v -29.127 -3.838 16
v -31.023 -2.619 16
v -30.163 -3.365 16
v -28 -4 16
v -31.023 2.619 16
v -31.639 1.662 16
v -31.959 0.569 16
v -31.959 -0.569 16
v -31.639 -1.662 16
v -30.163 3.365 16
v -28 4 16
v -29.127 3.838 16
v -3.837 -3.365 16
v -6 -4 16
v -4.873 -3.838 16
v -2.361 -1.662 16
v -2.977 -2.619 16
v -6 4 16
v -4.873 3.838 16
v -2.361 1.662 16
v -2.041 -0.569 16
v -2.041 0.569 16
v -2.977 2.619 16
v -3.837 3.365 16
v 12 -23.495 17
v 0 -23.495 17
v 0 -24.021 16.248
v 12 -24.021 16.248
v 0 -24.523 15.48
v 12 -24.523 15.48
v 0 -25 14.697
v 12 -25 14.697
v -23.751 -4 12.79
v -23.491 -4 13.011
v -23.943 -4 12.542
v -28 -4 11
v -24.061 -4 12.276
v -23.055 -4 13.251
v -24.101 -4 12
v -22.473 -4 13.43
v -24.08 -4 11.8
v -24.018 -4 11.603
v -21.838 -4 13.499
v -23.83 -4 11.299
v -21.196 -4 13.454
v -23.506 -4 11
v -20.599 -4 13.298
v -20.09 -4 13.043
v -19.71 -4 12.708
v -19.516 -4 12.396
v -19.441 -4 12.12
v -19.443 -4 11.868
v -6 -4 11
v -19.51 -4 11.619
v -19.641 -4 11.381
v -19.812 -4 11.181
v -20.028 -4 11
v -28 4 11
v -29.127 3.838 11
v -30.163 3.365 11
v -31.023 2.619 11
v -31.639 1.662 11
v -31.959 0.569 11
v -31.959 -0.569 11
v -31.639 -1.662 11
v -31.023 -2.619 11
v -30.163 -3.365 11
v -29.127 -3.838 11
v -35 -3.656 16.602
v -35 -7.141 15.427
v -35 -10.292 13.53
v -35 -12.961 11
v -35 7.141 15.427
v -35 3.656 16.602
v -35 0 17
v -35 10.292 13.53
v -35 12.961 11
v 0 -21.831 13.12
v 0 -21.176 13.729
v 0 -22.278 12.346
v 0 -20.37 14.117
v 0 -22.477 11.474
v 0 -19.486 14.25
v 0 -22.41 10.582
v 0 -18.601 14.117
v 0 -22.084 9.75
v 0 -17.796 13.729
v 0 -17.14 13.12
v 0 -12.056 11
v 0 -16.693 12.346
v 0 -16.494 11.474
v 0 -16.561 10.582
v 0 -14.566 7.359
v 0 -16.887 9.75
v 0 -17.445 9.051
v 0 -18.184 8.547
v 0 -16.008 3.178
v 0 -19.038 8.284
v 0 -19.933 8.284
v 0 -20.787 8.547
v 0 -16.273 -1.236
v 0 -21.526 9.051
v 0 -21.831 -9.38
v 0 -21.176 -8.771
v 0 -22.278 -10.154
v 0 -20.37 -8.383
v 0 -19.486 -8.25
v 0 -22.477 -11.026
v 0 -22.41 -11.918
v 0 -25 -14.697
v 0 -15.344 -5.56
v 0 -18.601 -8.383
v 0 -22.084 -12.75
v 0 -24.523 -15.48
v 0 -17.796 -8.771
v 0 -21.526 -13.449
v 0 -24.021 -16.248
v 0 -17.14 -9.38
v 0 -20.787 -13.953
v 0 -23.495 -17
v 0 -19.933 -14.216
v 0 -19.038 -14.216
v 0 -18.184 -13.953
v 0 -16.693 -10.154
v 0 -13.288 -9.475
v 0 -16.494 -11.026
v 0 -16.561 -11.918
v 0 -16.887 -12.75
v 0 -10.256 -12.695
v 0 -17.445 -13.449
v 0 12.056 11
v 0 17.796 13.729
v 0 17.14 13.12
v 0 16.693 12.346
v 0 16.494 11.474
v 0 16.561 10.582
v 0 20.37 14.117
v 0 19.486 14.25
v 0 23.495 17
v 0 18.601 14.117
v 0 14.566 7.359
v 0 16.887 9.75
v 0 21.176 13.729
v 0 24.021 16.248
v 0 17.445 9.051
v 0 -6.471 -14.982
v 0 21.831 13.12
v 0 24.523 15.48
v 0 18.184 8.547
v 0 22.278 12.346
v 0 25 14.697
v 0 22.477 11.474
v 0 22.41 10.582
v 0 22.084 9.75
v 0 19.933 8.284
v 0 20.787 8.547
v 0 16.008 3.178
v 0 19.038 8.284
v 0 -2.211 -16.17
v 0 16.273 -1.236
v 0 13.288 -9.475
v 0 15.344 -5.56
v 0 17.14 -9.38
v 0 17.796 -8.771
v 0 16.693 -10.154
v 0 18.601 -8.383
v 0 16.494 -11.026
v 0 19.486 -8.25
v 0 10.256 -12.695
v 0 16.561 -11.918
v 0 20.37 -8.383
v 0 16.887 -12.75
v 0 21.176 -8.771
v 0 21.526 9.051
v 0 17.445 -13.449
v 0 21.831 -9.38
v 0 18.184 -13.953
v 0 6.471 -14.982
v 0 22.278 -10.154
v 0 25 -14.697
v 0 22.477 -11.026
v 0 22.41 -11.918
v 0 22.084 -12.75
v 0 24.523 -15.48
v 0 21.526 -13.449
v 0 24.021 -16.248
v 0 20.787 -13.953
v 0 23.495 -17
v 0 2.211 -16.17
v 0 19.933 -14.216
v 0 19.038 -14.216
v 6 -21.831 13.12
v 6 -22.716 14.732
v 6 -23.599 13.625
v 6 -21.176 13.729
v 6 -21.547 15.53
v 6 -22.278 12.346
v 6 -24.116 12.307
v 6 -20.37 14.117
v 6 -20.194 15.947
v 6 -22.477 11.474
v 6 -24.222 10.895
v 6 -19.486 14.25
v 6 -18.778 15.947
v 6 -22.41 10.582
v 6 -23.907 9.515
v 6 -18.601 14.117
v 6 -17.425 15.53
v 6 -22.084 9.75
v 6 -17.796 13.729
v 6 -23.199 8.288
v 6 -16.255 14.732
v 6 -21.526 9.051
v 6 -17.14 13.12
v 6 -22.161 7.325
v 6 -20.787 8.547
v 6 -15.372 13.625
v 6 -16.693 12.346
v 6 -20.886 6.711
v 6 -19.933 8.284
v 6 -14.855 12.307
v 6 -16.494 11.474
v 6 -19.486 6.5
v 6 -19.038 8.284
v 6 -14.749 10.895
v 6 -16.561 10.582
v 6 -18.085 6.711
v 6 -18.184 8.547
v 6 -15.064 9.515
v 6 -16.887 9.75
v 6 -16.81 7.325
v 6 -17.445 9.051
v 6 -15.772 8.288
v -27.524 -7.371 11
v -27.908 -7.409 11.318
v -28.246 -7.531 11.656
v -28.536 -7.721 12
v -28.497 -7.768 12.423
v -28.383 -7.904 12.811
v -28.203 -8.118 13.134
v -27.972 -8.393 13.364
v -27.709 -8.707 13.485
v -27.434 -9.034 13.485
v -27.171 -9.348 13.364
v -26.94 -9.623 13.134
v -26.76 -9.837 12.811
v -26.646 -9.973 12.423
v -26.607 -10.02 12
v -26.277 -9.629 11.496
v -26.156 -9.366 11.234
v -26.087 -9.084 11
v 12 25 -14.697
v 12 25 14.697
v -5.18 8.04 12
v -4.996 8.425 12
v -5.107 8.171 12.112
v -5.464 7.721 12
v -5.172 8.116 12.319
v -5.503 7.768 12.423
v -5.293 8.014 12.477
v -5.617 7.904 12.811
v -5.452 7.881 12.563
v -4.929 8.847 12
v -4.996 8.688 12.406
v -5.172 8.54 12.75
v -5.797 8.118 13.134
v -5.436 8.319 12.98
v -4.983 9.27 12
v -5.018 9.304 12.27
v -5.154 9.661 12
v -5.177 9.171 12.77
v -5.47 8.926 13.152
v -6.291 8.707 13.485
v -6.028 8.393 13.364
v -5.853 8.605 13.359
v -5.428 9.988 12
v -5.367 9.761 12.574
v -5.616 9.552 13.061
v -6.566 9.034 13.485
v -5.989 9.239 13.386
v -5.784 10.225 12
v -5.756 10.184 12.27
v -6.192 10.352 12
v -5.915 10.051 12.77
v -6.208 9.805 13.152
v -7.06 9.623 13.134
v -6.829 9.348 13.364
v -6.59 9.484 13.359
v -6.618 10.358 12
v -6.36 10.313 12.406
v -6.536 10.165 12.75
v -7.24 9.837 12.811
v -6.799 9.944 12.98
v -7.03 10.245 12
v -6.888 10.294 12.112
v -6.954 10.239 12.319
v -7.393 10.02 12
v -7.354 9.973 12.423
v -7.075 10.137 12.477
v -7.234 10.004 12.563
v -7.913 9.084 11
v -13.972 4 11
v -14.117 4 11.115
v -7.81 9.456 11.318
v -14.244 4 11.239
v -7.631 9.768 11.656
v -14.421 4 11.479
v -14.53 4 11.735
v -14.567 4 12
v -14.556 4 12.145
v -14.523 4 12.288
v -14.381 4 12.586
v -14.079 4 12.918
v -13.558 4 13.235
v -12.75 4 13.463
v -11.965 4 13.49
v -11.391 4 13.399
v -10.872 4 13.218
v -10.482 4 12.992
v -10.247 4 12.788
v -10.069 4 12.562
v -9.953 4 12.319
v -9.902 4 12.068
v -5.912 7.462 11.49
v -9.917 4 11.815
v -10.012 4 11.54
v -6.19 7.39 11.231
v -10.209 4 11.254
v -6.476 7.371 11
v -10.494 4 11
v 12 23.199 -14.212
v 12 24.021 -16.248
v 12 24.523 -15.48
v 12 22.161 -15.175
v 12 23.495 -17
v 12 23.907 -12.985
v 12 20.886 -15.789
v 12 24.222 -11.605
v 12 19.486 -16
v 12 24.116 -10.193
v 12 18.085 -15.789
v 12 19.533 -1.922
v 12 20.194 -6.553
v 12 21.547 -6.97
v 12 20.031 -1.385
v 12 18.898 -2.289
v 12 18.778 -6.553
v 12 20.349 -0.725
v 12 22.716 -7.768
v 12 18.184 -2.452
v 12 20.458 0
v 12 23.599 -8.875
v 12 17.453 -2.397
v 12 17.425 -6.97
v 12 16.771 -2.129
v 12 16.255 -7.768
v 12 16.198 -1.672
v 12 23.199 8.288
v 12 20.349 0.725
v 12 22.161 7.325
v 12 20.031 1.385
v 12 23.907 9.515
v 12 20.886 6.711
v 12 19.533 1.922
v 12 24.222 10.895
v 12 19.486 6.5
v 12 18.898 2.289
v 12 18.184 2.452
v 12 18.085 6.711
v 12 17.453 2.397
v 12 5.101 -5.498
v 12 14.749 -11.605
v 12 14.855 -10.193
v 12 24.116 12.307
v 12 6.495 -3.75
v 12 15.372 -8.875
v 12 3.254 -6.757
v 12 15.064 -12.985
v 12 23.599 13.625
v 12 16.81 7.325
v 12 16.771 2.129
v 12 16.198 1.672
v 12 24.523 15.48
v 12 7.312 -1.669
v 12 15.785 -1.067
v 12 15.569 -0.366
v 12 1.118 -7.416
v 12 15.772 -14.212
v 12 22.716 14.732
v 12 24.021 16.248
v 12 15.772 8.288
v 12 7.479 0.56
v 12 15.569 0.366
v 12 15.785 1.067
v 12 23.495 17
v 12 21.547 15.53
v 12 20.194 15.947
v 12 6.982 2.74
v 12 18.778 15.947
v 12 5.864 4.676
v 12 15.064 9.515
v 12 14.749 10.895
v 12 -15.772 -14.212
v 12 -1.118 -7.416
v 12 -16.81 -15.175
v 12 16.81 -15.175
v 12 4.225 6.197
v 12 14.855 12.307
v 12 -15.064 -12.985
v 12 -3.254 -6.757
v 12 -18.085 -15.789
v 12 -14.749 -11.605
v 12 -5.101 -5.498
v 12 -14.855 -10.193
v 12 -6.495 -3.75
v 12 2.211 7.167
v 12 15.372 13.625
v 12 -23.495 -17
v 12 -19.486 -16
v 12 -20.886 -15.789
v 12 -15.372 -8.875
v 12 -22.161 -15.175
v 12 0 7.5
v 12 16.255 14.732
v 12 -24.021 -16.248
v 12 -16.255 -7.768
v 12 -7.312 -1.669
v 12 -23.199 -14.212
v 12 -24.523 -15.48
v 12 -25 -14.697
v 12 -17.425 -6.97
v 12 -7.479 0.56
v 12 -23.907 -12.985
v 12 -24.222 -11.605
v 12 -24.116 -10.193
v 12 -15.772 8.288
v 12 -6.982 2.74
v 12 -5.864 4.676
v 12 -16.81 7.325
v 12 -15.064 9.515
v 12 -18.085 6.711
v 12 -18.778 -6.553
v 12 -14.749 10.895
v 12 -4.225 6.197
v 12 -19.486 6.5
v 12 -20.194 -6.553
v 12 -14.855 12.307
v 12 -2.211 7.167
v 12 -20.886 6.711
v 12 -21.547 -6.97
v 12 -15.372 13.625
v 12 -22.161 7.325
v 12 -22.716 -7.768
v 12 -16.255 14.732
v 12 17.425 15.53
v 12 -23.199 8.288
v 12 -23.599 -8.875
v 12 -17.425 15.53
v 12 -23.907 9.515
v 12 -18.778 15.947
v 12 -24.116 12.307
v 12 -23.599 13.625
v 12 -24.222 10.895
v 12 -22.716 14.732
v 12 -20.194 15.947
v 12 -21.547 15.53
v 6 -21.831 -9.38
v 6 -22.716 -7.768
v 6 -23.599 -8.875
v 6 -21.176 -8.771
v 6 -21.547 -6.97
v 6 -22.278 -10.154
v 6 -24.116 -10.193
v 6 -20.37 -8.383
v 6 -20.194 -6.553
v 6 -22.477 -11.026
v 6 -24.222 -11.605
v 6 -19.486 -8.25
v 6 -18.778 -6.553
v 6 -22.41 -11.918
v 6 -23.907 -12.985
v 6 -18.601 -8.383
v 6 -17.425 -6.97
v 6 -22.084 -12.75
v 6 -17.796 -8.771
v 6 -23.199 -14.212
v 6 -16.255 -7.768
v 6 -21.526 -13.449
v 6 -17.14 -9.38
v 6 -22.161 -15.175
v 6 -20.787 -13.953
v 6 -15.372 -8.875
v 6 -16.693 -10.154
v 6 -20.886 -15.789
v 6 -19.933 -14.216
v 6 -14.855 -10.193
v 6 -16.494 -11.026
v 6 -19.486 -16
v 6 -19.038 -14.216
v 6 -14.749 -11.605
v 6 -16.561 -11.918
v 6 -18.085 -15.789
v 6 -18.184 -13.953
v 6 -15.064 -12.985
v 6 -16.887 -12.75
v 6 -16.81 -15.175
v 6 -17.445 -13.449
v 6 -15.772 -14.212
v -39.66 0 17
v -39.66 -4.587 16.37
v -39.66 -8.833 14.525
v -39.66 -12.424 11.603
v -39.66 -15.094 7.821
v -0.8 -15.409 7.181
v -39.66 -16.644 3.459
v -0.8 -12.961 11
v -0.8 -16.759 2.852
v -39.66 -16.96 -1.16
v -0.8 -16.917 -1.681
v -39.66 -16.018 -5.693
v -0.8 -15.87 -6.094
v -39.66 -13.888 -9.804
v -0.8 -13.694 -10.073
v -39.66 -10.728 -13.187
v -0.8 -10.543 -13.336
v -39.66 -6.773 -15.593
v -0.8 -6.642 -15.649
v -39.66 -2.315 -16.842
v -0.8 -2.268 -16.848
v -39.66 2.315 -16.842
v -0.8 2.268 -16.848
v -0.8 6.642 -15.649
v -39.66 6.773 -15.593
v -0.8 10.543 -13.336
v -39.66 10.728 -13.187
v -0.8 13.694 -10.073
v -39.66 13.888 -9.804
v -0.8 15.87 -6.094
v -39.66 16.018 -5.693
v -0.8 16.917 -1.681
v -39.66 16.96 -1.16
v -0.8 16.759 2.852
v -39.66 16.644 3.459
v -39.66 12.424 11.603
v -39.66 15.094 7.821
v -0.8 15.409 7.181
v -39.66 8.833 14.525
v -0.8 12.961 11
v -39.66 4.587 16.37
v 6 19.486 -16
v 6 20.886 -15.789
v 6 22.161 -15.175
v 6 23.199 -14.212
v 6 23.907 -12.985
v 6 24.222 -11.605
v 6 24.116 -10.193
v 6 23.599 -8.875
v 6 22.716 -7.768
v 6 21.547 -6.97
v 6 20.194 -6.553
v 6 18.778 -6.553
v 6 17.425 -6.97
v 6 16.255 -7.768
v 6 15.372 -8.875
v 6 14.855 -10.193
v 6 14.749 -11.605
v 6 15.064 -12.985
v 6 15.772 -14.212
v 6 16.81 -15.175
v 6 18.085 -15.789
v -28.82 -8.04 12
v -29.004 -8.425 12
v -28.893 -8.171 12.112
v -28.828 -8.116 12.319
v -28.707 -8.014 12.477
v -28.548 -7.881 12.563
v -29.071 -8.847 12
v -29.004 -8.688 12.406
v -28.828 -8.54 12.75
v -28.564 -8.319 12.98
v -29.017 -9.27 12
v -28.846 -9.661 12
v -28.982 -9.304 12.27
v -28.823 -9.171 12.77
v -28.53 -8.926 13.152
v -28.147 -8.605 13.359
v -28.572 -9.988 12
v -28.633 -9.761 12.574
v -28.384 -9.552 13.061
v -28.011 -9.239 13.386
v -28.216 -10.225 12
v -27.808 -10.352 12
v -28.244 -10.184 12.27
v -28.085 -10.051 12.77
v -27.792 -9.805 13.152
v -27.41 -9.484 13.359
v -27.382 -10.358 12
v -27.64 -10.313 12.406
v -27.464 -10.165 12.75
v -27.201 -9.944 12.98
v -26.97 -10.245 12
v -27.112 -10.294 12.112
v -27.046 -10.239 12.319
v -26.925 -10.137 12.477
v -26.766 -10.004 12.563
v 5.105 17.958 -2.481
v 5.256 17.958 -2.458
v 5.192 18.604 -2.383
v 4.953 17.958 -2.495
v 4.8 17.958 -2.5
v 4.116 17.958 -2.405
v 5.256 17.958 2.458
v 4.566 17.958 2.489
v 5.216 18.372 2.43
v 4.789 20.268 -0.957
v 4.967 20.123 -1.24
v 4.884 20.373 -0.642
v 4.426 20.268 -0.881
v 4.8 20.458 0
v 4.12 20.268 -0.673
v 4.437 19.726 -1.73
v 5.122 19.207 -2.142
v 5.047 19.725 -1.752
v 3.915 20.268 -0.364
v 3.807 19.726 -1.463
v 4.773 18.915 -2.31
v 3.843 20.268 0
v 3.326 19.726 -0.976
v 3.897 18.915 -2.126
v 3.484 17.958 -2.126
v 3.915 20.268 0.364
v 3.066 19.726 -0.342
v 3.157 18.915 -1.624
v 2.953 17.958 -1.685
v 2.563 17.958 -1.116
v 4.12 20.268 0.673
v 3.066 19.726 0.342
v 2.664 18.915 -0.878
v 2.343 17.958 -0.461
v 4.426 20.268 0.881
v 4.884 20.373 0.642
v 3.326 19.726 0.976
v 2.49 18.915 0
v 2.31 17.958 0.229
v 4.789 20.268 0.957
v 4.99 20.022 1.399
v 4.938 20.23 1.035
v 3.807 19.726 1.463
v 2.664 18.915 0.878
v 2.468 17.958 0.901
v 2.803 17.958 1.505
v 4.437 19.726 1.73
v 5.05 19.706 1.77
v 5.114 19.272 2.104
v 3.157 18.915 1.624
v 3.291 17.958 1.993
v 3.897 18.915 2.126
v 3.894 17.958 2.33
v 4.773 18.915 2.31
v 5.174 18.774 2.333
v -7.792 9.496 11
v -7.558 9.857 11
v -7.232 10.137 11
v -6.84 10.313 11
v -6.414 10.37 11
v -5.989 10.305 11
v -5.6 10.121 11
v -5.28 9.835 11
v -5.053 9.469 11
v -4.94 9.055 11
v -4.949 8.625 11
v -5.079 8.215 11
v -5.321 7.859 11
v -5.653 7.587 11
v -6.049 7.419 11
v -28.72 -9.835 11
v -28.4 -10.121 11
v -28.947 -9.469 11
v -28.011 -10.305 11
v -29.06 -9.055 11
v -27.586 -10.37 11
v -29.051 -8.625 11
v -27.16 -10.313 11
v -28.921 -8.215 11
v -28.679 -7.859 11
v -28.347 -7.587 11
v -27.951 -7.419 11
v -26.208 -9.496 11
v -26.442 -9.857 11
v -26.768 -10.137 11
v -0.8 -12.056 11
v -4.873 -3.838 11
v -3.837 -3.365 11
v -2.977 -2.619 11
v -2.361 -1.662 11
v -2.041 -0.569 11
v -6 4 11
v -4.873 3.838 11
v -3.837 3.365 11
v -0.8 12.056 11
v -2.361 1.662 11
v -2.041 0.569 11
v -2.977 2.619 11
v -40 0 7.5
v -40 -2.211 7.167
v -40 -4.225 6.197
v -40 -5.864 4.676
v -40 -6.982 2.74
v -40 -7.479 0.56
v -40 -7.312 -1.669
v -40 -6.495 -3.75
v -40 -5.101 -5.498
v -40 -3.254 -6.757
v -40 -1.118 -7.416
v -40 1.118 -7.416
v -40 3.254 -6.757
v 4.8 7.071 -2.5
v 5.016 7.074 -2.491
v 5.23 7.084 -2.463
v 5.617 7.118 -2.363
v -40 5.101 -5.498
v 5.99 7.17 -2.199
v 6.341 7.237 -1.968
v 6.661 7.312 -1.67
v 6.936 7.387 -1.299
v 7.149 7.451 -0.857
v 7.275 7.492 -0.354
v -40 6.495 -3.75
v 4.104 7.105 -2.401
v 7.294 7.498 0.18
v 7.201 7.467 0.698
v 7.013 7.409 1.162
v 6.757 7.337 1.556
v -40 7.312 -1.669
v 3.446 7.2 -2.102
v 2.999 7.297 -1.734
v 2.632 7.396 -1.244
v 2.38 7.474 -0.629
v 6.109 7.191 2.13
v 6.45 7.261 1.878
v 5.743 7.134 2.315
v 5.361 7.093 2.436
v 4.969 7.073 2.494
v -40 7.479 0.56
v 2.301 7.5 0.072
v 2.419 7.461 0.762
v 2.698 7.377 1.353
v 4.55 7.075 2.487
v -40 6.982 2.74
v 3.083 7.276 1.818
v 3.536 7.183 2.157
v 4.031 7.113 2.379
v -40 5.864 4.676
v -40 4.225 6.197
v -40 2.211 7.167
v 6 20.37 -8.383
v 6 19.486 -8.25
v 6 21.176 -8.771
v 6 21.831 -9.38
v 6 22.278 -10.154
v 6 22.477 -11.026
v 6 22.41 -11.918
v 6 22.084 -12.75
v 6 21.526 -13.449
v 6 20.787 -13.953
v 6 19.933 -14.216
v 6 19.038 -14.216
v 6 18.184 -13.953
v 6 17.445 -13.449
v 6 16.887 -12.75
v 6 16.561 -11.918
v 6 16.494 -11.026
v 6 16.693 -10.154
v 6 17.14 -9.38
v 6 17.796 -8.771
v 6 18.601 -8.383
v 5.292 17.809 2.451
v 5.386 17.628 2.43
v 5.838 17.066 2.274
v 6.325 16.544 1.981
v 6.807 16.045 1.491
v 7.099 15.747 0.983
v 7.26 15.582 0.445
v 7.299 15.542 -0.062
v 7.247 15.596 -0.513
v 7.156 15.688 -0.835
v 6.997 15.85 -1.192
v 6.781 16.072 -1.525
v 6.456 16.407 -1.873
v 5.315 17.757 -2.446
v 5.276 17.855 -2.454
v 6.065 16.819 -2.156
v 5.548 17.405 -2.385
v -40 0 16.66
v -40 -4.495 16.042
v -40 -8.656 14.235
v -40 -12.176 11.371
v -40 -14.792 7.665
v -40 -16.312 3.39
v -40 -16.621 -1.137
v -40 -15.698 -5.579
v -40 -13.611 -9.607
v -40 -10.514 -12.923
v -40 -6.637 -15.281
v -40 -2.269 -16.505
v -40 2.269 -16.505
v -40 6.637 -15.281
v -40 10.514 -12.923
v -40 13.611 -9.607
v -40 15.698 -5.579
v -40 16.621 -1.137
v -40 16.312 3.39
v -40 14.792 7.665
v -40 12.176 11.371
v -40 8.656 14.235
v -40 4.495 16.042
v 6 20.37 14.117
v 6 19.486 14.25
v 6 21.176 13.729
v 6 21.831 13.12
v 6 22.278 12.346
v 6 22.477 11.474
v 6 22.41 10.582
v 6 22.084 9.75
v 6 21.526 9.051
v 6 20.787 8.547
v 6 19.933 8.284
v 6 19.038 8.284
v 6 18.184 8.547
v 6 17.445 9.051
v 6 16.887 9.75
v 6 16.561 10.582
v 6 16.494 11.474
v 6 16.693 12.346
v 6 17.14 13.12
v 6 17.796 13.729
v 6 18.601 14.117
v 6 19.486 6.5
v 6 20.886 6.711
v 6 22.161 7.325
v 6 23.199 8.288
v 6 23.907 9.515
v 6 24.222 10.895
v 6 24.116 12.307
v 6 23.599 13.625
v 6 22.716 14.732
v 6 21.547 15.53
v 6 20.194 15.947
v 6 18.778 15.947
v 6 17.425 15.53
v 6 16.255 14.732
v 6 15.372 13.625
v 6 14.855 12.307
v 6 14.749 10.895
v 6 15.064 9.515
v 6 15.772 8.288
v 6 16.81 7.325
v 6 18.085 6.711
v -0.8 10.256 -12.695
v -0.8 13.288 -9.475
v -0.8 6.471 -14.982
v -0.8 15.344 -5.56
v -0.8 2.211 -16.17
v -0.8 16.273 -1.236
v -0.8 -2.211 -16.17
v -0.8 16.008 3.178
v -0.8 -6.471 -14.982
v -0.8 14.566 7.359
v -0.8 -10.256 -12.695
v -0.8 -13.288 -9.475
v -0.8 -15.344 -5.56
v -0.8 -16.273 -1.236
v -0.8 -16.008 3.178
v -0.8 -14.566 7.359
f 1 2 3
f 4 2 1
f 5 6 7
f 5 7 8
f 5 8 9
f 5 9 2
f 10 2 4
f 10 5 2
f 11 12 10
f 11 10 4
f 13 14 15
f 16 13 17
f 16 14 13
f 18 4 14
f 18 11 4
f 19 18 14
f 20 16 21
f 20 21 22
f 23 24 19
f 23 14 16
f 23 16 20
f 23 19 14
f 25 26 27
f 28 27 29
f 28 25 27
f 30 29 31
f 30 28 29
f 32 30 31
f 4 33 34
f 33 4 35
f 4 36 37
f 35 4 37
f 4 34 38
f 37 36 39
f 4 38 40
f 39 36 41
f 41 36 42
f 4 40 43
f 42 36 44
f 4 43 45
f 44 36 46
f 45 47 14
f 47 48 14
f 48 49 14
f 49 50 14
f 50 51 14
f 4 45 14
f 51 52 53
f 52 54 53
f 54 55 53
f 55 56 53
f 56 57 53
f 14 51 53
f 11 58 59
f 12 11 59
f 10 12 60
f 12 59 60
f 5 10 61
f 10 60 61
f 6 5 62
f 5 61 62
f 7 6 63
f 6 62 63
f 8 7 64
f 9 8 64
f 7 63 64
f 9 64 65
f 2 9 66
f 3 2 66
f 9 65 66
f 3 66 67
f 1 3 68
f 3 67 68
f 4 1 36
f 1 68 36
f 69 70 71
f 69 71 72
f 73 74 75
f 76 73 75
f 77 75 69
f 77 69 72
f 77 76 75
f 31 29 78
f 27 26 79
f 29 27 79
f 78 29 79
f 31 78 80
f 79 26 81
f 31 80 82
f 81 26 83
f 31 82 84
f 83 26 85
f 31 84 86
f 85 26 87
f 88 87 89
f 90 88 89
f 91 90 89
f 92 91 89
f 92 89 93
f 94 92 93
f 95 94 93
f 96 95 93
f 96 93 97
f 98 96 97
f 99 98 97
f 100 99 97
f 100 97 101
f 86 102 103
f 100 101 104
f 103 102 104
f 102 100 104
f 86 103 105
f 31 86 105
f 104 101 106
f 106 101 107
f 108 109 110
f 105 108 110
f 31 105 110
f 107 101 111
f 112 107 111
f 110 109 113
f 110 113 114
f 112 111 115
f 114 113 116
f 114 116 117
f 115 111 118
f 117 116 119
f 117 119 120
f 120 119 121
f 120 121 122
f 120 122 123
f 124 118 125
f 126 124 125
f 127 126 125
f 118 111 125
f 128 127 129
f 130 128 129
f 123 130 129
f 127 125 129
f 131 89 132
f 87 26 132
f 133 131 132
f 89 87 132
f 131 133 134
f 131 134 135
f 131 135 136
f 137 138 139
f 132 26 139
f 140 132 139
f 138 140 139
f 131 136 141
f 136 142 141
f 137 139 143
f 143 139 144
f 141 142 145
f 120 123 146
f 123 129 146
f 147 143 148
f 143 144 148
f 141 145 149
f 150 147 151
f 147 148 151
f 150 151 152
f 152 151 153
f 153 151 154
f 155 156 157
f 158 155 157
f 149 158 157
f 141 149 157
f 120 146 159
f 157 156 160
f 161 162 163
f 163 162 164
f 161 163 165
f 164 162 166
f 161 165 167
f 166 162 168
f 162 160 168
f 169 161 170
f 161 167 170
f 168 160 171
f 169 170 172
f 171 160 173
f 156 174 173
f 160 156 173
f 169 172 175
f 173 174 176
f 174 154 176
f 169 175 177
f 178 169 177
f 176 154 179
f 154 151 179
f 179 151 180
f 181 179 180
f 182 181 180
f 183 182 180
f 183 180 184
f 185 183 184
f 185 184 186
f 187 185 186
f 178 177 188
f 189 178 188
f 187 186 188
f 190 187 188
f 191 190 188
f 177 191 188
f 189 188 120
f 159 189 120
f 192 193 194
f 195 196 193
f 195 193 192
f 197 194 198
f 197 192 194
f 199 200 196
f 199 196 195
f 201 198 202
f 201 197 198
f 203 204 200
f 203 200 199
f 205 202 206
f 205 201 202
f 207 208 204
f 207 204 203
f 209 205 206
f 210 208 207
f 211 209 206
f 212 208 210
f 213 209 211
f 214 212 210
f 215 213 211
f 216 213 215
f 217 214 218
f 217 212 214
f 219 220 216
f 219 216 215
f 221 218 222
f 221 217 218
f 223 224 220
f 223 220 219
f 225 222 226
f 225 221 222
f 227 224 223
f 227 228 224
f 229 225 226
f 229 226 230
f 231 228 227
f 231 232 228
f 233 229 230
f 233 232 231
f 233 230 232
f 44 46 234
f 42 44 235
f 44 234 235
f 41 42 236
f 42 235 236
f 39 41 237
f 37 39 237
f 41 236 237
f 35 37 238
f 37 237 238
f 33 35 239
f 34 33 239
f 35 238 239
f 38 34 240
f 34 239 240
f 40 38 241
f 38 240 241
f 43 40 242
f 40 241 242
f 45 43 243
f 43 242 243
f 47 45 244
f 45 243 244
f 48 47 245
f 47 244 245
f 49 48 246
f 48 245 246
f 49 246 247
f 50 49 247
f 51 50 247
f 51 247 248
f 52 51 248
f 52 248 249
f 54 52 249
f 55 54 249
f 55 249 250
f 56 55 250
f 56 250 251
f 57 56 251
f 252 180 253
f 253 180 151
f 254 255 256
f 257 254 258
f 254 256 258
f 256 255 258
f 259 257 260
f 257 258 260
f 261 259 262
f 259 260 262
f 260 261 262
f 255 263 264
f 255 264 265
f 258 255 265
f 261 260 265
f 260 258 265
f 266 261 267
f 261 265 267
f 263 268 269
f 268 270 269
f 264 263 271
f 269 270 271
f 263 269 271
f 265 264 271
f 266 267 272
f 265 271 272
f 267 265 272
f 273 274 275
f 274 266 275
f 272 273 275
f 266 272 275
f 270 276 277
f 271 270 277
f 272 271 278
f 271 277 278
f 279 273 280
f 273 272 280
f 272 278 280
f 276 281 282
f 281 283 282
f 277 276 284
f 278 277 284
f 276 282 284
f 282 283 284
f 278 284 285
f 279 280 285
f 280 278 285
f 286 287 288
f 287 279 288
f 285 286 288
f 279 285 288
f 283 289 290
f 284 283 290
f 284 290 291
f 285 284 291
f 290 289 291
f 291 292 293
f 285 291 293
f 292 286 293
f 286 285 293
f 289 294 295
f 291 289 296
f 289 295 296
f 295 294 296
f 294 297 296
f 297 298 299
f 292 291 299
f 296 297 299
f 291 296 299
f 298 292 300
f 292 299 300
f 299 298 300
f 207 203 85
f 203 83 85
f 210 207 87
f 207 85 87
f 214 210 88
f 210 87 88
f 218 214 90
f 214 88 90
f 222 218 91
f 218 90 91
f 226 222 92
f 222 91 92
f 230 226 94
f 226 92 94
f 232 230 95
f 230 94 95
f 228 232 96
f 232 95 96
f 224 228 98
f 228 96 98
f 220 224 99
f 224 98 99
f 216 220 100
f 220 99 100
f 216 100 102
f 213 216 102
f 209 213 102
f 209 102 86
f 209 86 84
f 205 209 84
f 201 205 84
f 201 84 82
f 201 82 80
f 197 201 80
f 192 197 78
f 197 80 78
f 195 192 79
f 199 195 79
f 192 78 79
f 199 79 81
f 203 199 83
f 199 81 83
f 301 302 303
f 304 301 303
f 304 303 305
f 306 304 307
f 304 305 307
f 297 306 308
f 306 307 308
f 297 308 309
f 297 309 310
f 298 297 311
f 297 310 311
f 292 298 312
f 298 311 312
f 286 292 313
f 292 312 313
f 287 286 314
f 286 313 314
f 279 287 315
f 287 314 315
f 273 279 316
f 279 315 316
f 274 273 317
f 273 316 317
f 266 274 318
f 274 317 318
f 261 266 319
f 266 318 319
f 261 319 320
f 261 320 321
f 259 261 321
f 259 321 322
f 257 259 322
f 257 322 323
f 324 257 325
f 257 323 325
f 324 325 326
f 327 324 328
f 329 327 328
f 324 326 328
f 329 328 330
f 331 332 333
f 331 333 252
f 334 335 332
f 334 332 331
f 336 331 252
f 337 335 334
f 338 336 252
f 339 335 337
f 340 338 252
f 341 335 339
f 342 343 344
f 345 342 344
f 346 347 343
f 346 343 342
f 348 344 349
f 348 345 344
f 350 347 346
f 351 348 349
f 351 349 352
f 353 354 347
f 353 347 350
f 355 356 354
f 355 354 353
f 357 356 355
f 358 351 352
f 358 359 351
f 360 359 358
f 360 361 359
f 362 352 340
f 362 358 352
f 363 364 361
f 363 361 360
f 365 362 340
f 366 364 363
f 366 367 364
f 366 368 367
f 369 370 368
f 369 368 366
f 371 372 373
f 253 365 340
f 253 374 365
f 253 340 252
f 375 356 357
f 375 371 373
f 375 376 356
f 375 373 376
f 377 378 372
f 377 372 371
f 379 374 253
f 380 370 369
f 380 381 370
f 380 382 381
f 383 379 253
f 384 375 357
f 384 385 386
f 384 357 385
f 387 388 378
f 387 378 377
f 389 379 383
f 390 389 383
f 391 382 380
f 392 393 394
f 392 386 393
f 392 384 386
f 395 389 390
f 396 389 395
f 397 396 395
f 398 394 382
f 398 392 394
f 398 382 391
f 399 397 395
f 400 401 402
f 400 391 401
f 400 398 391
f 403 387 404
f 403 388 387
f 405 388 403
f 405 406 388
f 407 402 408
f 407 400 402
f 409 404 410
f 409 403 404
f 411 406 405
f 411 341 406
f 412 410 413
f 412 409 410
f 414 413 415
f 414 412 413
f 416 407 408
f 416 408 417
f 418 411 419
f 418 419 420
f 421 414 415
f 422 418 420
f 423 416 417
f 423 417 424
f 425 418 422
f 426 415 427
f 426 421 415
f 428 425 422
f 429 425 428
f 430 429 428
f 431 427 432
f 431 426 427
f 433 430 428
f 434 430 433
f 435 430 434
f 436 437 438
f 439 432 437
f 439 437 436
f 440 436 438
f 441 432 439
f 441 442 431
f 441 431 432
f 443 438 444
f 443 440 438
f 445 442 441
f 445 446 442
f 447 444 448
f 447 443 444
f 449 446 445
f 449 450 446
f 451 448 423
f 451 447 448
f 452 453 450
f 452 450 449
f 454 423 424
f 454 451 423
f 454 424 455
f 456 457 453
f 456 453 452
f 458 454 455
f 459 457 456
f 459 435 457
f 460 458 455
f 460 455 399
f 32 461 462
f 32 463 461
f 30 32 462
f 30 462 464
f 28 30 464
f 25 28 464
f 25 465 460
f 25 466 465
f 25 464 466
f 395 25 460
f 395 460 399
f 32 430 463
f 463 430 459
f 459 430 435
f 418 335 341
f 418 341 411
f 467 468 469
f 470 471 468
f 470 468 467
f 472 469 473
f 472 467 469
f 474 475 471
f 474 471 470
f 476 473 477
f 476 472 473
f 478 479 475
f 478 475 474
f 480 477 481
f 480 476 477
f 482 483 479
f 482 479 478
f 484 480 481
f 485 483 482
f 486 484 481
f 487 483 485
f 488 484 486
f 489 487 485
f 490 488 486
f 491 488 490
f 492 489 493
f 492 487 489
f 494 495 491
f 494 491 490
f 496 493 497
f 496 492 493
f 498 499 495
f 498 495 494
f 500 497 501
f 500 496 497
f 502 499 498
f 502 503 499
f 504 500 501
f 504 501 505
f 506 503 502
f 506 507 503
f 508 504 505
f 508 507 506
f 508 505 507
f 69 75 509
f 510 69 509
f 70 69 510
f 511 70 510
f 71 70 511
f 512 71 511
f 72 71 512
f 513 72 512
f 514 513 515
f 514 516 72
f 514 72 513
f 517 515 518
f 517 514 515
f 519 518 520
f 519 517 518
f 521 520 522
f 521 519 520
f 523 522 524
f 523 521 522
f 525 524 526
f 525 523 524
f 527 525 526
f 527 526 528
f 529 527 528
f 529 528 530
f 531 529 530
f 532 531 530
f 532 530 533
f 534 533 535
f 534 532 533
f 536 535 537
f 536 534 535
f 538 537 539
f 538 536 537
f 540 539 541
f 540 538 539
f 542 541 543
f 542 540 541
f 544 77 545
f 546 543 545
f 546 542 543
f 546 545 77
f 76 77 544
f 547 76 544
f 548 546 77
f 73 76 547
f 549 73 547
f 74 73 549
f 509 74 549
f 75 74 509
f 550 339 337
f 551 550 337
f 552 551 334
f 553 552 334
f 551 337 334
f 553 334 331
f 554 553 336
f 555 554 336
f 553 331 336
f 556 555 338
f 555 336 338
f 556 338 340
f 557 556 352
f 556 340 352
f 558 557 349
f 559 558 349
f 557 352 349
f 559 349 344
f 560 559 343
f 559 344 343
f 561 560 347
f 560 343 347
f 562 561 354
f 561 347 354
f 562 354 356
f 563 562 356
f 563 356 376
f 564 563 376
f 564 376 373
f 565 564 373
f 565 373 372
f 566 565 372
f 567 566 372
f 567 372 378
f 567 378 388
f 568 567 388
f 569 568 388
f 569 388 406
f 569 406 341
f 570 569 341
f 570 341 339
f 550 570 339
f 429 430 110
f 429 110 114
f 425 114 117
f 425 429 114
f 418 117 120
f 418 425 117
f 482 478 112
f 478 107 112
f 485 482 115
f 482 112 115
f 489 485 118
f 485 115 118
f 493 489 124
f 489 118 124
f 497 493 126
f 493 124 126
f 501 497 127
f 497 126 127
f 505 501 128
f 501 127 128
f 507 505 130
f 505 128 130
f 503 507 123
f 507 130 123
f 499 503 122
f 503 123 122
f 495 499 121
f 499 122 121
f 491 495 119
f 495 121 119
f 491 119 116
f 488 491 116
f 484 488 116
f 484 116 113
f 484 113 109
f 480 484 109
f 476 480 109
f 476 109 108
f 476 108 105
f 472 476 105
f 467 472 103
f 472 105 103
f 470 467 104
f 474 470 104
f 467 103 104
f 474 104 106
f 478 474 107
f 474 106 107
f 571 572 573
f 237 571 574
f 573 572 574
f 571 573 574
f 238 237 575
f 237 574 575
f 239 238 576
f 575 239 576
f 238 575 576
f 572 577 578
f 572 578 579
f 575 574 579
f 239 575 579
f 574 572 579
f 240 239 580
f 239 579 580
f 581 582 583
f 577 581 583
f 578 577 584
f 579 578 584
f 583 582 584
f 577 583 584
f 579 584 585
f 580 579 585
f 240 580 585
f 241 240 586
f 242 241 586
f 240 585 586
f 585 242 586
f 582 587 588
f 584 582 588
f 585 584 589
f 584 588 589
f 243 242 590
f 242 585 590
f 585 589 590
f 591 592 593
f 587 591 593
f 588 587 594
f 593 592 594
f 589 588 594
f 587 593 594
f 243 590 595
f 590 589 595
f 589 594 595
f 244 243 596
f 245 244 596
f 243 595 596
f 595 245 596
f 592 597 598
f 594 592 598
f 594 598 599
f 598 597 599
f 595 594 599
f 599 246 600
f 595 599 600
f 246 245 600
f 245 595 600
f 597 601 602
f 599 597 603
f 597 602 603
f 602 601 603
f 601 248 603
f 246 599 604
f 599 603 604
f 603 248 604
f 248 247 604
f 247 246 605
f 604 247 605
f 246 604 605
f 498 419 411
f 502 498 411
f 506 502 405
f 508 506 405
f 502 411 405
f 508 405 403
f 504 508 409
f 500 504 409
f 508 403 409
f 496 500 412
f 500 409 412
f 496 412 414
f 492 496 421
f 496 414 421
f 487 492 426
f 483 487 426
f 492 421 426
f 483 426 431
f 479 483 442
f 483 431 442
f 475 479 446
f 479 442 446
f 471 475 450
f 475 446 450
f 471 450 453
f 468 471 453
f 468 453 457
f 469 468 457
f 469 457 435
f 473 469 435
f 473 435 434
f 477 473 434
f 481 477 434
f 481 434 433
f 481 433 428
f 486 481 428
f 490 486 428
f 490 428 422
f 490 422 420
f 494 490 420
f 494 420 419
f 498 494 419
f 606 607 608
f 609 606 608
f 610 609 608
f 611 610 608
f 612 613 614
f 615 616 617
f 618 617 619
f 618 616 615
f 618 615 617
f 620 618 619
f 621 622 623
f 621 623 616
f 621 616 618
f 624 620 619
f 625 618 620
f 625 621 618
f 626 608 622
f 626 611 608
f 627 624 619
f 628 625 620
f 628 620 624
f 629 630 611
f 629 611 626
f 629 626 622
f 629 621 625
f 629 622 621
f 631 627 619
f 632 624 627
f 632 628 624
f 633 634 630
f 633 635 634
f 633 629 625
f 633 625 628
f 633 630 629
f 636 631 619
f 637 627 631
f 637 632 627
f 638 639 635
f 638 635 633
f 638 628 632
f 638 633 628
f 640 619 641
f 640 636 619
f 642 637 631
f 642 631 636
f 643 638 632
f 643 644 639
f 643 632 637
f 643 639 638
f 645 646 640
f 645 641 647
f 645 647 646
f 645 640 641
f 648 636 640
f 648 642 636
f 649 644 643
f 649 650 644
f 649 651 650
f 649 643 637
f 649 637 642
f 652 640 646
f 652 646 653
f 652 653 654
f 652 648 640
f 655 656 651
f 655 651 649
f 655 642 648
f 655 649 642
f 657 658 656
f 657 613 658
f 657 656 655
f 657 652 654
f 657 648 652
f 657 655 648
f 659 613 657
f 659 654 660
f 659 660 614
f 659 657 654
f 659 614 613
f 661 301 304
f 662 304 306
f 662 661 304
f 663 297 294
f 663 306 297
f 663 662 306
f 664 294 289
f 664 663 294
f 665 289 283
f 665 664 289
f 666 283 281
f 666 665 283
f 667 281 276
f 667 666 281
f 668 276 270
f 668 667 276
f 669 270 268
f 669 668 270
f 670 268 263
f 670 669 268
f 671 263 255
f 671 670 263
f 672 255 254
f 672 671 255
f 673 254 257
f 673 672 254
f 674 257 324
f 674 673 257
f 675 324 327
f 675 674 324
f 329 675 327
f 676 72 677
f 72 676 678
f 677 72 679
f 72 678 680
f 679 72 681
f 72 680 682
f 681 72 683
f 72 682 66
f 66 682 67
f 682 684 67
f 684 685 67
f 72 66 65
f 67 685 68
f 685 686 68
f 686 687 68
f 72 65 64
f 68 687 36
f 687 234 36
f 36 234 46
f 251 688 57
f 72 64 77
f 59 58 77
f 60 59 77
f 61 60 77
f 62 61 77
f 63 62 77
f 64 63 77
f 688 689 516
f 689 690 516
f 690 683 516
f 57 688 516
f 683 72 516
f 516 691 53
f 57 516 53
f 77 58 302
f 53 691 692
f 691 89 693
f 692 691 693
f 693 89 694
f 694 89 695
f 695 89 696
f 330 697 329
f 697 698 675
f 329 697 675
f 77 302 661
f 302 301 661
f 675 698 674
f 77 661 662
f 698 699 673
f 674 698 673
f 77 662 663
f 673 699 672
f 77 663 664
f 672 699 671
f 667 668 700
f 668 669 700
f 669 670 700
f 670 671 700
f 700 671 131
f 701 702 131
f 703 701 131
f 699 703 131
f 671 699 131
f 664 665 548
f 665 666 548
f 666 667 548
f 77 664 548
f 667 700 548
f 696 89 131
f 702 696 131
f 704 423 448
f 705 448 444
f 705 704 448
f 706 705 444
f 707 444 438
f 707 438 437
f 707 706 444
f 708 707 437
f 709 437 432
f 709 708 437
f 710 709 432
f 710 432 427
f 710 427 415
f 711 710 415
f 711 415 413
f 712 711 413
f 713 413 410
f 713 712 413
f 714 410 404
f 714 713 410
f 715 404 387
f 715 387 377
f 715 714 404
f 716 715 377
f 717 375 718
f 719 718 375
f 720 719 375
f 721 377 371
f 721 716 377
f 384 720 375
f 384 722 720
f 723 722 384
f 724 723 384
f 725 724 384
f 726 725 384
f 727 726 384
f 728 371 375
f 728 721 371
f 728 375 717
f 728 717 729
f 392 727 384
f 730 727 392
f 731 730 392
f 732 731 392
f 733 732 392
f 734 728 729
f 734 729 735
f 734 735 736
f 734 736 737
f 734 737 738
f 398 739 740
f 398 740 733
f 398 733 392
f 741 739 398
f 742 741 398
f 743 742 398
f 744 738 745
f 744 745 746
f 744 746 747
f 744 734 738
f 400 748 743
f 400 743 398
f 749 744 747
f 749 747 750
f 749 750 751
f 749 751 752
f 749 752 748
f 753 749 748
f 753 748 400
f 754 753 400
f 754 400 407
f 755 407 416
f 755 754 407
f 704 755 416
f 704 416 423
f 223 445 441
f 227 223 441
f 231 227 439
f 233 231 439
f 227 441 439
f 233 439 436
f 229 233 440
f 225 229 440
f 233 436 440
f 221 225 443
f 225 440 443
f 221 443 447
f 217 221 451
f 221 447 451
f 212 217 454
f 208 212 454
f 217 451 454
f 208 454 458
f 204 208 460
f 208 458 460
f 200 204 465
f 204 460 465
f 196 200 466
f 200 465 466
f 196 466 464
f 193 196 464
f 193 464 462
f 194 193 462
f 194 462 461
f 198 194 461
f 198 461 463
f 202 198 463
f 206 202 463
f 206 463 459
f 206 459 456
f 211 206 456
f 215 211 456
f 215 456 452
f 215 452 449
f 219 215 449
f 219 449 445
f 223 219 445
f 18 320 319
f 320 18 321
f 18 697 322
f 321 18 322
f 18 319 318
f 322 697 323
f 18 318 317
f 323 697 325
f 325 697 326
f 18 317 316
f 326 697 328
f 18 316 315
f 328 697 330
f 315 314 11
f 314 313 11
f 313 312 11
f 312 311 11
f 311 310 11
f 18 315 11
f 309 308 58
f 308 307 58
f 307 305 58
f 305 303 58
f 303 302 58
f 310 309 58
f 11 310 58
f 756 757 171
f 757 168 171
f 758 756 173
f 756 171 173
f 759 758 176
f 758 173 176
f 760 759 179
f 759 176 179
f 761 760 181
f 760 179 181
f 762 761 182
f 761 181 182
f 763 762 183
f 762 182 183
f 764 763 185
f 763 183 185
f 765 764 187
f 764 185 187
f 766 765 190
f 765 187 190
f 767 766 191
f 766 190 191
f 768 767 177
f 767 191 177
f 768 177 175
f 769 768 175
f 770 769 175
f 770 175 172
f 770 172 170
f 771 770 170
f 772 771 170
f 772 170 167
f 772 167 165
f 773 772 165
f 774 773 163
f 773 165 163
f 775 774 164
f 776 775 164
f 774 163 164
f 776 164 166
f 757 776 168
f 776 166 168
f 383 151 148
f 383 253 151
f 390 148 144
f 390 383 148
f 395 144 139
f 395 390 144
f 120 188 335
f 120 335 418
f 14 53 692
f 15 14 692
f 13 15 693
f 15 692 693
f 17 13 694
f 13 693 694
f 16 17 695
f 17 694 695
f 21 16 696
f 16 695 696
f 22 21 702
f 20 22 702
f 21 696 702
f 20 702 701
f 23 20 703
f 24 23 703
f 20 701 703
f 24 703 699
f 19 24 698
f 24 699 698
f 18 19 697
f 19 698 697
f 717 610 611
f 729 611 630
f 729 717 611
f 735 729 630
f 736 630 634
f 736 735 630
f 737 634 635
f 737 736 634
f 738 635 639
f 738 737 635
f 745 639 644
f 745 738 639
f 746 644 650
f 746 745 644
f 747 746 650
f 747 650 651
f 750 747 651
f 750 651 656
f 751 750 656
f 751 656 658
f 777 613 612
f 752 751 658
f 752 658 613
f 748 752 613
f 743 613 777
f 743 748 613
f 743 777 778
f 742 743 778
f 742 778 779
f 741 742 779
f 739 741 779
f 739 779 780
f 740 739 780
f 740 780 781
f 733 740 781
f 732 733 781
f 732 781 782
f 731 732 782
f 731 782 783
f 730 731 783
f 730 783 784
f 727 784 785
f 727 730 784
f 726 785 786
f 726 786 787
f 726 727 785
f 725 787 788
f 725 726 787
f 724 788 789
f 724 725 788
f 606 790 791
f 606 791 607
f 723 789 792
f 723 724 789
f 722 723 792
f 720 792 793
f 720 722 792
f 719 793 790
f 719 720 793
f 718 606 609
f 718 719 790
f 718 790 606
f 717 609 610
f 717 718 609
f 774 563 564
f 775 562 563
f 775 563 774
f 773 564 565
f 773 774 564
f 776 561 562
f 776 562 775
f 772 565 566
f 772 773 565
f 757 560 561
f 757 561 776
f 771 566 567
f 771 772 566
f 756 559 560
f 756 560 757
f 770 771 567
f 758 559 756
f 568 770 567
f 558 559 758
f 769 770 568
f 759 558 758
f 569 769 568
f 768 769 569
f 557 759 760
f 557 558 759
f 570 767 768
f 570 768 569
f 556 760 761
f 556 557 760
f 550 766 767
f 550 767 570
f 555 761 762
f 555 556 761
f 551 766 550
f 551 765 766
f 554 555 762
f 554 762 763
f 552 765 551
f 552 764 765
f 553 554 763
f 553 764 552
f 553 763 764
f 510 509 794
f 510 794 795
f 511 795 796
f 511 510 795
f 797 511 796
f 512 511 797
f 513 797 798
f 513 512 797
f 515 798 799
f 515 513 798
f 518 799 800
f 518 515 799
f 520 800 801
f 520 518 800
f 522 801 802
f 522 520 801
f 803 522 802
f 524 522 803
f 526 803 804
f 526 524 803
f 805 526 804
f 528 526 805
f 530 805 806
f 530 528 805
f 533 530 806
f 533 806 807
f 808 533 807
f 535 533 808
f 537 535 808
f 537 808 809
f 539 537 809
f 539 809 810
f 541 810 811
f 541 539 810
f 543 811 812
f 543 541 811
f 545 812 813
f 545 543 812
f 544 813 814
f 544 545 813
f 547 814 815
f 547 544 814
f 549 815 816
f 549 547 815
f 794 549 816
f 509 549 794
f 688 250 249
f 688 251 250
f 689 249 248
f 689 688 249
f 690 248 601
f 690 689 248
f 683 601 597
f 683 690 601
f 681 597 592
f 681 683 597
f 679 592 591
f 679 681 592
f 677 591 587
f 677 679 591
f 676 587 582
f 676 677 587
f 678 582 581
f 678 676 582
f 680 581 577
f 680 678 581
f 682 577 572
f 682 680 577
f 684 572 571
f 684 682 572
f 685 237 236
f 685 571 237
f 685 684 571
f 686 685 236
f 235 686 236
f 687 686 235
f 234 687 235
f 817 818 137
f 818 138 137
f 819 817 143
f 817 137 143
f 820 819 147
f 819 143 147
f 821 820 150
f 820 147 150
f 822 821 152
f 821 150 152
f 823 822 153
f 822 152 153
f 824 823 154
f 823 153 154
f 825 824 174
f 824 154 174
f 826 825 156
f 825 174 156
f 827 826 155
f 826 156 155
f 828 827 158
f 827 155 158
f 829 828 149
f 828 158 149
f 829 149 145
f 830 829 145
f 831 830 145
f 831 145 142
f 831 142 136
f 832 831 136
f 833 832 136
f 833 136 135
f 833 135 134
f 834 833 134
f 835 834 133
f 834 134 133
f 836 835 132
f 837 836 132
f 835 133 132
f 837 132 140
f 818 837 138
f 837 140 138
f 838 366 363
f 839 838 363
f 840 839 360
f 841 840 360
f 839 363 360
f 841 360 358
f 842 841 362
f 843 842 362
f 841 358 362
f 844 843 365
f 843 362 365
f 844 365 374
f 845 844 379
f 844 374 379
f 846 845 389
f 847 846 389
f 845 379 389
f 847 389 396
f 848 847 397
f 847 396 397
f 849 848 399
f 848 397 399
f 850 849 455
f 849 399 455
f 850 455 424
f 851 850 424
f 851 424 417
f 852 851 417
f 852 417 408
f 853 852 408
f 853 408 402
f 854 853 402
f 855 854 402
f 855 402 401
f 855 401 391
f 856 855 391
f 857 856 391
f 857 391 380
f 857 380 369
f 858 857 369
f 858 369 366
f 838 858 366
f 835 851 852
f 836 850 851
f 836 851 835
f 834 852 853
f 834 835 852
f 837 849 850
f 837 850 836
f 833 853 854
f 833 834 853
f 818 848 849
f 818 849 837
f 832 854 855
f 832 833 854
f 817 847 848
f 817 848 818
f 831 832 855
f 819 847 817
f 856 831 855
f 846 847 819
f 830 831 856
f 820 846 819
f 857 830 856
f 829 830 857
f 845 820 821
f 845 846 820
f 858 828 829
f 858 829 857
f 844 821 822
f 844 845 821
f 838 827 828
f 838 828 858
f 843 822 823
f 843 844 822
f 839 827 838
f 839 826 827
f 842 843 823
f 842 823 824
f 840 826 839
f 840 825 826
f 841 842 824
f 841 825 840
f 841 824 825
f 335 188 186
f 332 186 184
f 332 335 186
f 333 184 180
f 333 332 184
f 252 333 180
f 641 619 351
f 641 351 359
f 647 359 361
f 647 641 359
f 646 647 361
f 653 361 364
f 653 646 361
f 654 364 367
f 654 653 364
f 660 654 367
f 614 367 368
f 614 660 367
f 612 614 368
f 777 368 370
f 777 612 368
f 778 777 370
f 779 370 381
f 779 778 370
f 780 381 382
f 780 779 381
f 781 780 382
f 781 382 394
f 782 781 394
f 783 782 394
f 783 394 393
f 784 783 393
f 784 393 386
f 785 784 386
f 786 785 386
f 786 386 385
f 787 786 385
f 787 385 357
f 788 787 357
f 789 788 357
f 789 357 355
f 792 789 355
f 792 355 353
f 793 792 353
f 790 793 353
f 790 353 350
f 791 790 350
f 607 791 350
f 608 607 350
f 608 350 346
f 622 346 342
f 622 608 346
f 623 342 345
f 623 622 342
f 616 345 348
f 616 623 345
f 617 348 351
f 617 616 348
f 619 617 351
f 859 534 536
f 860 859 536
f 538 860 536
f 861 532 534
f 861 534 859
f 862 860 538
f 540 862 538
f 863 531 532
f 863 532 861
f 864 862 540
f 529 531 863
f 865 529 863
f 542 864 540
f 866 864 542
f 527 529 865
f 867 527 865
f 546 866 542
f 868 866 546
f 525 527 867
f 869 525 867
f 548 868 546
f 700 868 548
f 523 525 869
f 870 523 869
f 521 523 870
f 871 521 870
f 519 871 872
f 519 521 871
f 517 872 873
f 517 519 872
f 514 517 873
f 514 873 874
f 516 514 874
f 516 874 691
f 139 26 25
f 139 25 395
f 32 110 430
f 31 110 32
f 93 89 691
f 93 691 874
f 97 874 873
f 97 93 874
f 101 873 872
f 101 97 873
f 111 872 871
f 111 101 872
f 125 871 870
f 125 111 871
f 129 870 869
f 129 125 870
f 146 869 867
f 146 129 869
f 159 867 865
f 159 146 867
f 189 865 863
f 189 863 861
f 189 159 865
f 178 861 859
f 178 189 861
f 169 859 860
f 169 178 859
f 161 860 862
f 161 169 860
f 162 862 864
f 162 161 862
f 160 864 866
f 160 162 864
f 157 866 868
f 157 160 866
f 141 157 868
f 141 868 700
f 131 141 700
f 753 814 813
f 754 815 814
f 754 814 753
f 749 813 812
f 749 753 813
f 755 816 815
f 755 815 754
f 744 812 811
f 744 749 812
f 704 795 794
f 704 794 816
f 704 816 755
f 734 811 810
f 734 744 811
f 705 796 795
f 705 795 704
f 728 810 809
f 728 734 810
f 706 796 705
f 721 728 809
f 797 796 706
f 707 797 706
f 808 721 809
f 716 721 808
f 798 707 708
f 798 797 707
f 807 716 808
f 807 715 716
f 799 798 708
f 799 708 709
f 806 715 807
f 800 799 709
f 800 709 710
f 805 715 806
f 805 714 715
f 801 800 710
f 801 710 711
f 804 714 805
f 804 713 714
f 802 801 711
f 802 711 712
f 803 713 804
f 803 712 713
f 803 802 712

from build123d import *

# Parameters (mm, degrees)
CUT_EXTRUDE1_DEPTH                 = 58.28874235
CHAMFER1_SIZE                      = 0.34
SOCKET_HEAD_CAP_SCREW1_D           = 6
SOCKET_HEAD_CAP_SCREW1_CBORE_D     = 9.5
SOCKET_HEAD_CAP_SCREW1_CBORE_DEPTH = 6
CUT_EXTRUDE2_DEPTH                 = 35
BOSS_EXTRUDE1_DEPTH                = 5
SKETCH7_R                          = 1.5
BOSS_EXTRUDE2_DEPTH                = 1
REVOLVE3_ANGLE                     = 90
REVOLVE4_ANGLE                     = 90
TAP1_START                         = 4.7999999
TAP1_OUTLINE_R                     = 2.4585
TAP1_DEPTH                         = 7.2000001


# Read off the part's stored shape, not the designer's step: Tap1
with BuildPart() as part:
    # Sketch1 → Revolve1 (revolve)
    with BuildSketch(Plane.XY, mode=Mode.PRIVATE) as revolve1_sk:
        Polygon((0, 29), (12, 29), (12, 7.5), (-40, 7.5), (-40, 17), (-0.8, 17), (-0.8, 16.32), (0, 16.32), align=None)
    revolve(revolve1_sk.sketch.rotate(Axis((-40, 0, 0), (1, 0, 0)), 90), axis=Axis((-40, 0, 0), (1, 0, 0)))

    # Sketch2 → Cut-Extrude1 (cut, through all)
    with BuildSketch(Plane(origin=(0, 0, 0), x_dir=(0, 0, -1), z_dir=(1, 0, 0))):
        with BuildLine():
            Line((14.696938457, 25), (-14.696938457, 25))
            ThreePointArc((-14.696938457, 25), (0, 29), (14.696938457, 25))
        make_face()
        with BuildLine():
            Line((17, 23.494680249), (17, -23.494680249))
            ThreePointArc((17, -23.494680249), (29, 0), (17, 23.494680249))
        make_face()
        with BuildLine():
            Line((14.696938457, -25), (-14.696938457, -25))
            ThreePointArc((-14.696938457, -25), (0, -29), (14.696938457, -25))
        make_face()
        with BuildLine():
            Line((-17, -23.494680249), (-17, 23.494680249))
            ThreePointArc((-17, 23.494680249), (-29, 0), (-17, -23.494680249))
        make_face()
    extrude(amount=CUT_EXTRUDE1_DEPTH, mode=Mode.SUBTRACT)

    # Chamfer1
    chamfer1_edges = [part.edges().sort_by_distance(p)[0] for p in [
        (-40, 0, -17),
    ]]
    chamfer(chamfer1_edges, length=CHAMFER1_SIZE)

    # Socket Head Cap Screw1 (through all)
    with Locations(Plane(origin=(12, 0, 0), x_dir=(0, 0, -1), z_dir=(1, 0, 0))):
        with Locations((-11.25, 19.485571585), (11.25, -19.485571585), (-11.25, -19.485571585), (11.25, 19.485571585)):
            CounterBoreHole(SOCKET_HEAD_CAP_SCREW1_D / 2, SOCKET_HEAD_CAP_SCREW1_CBORE_D / 2, SOCKET_HEAD_CAP_SCREW1_CBORE_DEPTH)

    # Sketch5 → Cut-Extrude2 (cut)
    with BuildSketch(Plane(origin=(0, 0, 0), x_dir=(0, 0, -1), z_dir=(1, 0, 0))):
        with BuildLine():
            Line((-11, -12.961481397), (-11, 12.961481397))
            ThreePointArc((-11, 12.961481397), (-17, 0), (-11, -12.961481397))
        make_face()
    extrude(amount=-CUT_EXTRUDE2_DEPTH, mode=Mode.SUBTRACT)

    # Sketch6 → Boss-Extrude1 (add)
    with BuildSketch(Plane(origin=(0, 0, 11), x_dir=(-1, 0, 0), z_dir=(0, 0, -1))):
        with BuildLine():
            Line((6, 4), (28, 4))
            ThreePointArc((28, 4), (32, 0), (28, -4))
            Line((28, -4), (6, -4))
            ThreePointArc((6, -4), (2, 0), (6, 4))
        make_face()
    extrude(amount=-BOSS_EXTRUDE1_DEPTH)

    # Sketch7 → Boss-Extrude2 (add)
    with BuildSketch(Plane(origin=(0, 0, 11), x_dir=(-1, 0, 0), z_dir=(0, 0, -1))):
        with Locations(Location((27.571413315, -8.870469014, 0), (0, 0, 180))):
            Circle(SKETCH7_R)
        with Locations(Location((6.428586685, 8.870469014, 0), (0, 0, 180))):
            Circle(SKETCH7_R)
    extrude(amount=-BOSS_EXTRUDE2_DEPTH)

    # Sketch8 → Revolve2 (revolve)
    with BuildSketch(Plane.XY.offset(12)):
        Polygon((-27.571413315, -8.870469014), (-6.428586685, 8.870469014), (-7.392768099, 10.019535678), (-28.53559473, -7.721402349), align=None)
    revolve(axis=Axis((-27.571413315, -8.870469014, 12), (0.7660444431189788, 0.6427876096865385, 0)))

    # Sketch9 → Revolve3 (revolve)
    with BuildSketch(Plane.XY.offset(12)):
        with BuildLine():
            Line((-26.607231901, -10.019535678), (-28.53559473, -7.721402349))
            ThreePointArc((-28.53559473, -7.721402349), (-28.72047998, -9.834650428), (-26.607231901, -10.019535678))
        make_face()
    revolve(axis=Axis((-26.607231901, -10.019535678, 12), (-0.6427876096865375, 0.7660444431189796, 0)), revolution_arc=REVOLVE3_ANGLE)

    # Sketch10 → Revolve4 (revolve)
    with BuildSketch(Plane.XY.offset(12)):
        with BuildLine():
            Line((-7.392768099, 10.019535678), (-5.46440527, 7.721402349))
            ThreePointArc((-5.46440527, 7.721402349), (-5.27952002, 9.834650428), (-7.392768099, 10.019535678))
        make_face()
    revolve(axis=Axis((-7.392768099, 10.019535678, 12), (0.6427876096865389, -0.7660444431189785, 0)), revolution_arc=REVOLVE4_ANGLE)

    # Sketch11 → Cut-Revolve1 (revolve, cut)
    with BuildSketch(Plane.XY, mode=Mode.PRIVATE) as cut_revolve1_sk:
        with BuildLine():
            Line((2.3, 0), (4.8, 0))
            Line((4.8, 0), (4.8, 20.4585))
            ThreePointArc((4.8, 20.4585), (3.032233047, 19.726266953), (2.3, 17.9585))
            Line((2.3, 17.9585), (2.3, 0))
        make_face()
    revolve(cut_revolve1_sk.sketch.rotate(Axis((4.8, 0, 0), (0, 1, 0)), 270), axis=Axis((4.8, 0, 0), (0, 1, 0)), mode=Mode.SUBTRACT)

    # Tap1 outline → Tap1 (cut)
    with BuildSketch(Plane.YZ.offset(TAP1_START)):
        with Locations((18, 0)):
            Circle(TAP1_OUTLINE_R)
    extrude(amount=TAP1_DEPTH, mode=Mode.SUBTRACT)


solid = part.part
